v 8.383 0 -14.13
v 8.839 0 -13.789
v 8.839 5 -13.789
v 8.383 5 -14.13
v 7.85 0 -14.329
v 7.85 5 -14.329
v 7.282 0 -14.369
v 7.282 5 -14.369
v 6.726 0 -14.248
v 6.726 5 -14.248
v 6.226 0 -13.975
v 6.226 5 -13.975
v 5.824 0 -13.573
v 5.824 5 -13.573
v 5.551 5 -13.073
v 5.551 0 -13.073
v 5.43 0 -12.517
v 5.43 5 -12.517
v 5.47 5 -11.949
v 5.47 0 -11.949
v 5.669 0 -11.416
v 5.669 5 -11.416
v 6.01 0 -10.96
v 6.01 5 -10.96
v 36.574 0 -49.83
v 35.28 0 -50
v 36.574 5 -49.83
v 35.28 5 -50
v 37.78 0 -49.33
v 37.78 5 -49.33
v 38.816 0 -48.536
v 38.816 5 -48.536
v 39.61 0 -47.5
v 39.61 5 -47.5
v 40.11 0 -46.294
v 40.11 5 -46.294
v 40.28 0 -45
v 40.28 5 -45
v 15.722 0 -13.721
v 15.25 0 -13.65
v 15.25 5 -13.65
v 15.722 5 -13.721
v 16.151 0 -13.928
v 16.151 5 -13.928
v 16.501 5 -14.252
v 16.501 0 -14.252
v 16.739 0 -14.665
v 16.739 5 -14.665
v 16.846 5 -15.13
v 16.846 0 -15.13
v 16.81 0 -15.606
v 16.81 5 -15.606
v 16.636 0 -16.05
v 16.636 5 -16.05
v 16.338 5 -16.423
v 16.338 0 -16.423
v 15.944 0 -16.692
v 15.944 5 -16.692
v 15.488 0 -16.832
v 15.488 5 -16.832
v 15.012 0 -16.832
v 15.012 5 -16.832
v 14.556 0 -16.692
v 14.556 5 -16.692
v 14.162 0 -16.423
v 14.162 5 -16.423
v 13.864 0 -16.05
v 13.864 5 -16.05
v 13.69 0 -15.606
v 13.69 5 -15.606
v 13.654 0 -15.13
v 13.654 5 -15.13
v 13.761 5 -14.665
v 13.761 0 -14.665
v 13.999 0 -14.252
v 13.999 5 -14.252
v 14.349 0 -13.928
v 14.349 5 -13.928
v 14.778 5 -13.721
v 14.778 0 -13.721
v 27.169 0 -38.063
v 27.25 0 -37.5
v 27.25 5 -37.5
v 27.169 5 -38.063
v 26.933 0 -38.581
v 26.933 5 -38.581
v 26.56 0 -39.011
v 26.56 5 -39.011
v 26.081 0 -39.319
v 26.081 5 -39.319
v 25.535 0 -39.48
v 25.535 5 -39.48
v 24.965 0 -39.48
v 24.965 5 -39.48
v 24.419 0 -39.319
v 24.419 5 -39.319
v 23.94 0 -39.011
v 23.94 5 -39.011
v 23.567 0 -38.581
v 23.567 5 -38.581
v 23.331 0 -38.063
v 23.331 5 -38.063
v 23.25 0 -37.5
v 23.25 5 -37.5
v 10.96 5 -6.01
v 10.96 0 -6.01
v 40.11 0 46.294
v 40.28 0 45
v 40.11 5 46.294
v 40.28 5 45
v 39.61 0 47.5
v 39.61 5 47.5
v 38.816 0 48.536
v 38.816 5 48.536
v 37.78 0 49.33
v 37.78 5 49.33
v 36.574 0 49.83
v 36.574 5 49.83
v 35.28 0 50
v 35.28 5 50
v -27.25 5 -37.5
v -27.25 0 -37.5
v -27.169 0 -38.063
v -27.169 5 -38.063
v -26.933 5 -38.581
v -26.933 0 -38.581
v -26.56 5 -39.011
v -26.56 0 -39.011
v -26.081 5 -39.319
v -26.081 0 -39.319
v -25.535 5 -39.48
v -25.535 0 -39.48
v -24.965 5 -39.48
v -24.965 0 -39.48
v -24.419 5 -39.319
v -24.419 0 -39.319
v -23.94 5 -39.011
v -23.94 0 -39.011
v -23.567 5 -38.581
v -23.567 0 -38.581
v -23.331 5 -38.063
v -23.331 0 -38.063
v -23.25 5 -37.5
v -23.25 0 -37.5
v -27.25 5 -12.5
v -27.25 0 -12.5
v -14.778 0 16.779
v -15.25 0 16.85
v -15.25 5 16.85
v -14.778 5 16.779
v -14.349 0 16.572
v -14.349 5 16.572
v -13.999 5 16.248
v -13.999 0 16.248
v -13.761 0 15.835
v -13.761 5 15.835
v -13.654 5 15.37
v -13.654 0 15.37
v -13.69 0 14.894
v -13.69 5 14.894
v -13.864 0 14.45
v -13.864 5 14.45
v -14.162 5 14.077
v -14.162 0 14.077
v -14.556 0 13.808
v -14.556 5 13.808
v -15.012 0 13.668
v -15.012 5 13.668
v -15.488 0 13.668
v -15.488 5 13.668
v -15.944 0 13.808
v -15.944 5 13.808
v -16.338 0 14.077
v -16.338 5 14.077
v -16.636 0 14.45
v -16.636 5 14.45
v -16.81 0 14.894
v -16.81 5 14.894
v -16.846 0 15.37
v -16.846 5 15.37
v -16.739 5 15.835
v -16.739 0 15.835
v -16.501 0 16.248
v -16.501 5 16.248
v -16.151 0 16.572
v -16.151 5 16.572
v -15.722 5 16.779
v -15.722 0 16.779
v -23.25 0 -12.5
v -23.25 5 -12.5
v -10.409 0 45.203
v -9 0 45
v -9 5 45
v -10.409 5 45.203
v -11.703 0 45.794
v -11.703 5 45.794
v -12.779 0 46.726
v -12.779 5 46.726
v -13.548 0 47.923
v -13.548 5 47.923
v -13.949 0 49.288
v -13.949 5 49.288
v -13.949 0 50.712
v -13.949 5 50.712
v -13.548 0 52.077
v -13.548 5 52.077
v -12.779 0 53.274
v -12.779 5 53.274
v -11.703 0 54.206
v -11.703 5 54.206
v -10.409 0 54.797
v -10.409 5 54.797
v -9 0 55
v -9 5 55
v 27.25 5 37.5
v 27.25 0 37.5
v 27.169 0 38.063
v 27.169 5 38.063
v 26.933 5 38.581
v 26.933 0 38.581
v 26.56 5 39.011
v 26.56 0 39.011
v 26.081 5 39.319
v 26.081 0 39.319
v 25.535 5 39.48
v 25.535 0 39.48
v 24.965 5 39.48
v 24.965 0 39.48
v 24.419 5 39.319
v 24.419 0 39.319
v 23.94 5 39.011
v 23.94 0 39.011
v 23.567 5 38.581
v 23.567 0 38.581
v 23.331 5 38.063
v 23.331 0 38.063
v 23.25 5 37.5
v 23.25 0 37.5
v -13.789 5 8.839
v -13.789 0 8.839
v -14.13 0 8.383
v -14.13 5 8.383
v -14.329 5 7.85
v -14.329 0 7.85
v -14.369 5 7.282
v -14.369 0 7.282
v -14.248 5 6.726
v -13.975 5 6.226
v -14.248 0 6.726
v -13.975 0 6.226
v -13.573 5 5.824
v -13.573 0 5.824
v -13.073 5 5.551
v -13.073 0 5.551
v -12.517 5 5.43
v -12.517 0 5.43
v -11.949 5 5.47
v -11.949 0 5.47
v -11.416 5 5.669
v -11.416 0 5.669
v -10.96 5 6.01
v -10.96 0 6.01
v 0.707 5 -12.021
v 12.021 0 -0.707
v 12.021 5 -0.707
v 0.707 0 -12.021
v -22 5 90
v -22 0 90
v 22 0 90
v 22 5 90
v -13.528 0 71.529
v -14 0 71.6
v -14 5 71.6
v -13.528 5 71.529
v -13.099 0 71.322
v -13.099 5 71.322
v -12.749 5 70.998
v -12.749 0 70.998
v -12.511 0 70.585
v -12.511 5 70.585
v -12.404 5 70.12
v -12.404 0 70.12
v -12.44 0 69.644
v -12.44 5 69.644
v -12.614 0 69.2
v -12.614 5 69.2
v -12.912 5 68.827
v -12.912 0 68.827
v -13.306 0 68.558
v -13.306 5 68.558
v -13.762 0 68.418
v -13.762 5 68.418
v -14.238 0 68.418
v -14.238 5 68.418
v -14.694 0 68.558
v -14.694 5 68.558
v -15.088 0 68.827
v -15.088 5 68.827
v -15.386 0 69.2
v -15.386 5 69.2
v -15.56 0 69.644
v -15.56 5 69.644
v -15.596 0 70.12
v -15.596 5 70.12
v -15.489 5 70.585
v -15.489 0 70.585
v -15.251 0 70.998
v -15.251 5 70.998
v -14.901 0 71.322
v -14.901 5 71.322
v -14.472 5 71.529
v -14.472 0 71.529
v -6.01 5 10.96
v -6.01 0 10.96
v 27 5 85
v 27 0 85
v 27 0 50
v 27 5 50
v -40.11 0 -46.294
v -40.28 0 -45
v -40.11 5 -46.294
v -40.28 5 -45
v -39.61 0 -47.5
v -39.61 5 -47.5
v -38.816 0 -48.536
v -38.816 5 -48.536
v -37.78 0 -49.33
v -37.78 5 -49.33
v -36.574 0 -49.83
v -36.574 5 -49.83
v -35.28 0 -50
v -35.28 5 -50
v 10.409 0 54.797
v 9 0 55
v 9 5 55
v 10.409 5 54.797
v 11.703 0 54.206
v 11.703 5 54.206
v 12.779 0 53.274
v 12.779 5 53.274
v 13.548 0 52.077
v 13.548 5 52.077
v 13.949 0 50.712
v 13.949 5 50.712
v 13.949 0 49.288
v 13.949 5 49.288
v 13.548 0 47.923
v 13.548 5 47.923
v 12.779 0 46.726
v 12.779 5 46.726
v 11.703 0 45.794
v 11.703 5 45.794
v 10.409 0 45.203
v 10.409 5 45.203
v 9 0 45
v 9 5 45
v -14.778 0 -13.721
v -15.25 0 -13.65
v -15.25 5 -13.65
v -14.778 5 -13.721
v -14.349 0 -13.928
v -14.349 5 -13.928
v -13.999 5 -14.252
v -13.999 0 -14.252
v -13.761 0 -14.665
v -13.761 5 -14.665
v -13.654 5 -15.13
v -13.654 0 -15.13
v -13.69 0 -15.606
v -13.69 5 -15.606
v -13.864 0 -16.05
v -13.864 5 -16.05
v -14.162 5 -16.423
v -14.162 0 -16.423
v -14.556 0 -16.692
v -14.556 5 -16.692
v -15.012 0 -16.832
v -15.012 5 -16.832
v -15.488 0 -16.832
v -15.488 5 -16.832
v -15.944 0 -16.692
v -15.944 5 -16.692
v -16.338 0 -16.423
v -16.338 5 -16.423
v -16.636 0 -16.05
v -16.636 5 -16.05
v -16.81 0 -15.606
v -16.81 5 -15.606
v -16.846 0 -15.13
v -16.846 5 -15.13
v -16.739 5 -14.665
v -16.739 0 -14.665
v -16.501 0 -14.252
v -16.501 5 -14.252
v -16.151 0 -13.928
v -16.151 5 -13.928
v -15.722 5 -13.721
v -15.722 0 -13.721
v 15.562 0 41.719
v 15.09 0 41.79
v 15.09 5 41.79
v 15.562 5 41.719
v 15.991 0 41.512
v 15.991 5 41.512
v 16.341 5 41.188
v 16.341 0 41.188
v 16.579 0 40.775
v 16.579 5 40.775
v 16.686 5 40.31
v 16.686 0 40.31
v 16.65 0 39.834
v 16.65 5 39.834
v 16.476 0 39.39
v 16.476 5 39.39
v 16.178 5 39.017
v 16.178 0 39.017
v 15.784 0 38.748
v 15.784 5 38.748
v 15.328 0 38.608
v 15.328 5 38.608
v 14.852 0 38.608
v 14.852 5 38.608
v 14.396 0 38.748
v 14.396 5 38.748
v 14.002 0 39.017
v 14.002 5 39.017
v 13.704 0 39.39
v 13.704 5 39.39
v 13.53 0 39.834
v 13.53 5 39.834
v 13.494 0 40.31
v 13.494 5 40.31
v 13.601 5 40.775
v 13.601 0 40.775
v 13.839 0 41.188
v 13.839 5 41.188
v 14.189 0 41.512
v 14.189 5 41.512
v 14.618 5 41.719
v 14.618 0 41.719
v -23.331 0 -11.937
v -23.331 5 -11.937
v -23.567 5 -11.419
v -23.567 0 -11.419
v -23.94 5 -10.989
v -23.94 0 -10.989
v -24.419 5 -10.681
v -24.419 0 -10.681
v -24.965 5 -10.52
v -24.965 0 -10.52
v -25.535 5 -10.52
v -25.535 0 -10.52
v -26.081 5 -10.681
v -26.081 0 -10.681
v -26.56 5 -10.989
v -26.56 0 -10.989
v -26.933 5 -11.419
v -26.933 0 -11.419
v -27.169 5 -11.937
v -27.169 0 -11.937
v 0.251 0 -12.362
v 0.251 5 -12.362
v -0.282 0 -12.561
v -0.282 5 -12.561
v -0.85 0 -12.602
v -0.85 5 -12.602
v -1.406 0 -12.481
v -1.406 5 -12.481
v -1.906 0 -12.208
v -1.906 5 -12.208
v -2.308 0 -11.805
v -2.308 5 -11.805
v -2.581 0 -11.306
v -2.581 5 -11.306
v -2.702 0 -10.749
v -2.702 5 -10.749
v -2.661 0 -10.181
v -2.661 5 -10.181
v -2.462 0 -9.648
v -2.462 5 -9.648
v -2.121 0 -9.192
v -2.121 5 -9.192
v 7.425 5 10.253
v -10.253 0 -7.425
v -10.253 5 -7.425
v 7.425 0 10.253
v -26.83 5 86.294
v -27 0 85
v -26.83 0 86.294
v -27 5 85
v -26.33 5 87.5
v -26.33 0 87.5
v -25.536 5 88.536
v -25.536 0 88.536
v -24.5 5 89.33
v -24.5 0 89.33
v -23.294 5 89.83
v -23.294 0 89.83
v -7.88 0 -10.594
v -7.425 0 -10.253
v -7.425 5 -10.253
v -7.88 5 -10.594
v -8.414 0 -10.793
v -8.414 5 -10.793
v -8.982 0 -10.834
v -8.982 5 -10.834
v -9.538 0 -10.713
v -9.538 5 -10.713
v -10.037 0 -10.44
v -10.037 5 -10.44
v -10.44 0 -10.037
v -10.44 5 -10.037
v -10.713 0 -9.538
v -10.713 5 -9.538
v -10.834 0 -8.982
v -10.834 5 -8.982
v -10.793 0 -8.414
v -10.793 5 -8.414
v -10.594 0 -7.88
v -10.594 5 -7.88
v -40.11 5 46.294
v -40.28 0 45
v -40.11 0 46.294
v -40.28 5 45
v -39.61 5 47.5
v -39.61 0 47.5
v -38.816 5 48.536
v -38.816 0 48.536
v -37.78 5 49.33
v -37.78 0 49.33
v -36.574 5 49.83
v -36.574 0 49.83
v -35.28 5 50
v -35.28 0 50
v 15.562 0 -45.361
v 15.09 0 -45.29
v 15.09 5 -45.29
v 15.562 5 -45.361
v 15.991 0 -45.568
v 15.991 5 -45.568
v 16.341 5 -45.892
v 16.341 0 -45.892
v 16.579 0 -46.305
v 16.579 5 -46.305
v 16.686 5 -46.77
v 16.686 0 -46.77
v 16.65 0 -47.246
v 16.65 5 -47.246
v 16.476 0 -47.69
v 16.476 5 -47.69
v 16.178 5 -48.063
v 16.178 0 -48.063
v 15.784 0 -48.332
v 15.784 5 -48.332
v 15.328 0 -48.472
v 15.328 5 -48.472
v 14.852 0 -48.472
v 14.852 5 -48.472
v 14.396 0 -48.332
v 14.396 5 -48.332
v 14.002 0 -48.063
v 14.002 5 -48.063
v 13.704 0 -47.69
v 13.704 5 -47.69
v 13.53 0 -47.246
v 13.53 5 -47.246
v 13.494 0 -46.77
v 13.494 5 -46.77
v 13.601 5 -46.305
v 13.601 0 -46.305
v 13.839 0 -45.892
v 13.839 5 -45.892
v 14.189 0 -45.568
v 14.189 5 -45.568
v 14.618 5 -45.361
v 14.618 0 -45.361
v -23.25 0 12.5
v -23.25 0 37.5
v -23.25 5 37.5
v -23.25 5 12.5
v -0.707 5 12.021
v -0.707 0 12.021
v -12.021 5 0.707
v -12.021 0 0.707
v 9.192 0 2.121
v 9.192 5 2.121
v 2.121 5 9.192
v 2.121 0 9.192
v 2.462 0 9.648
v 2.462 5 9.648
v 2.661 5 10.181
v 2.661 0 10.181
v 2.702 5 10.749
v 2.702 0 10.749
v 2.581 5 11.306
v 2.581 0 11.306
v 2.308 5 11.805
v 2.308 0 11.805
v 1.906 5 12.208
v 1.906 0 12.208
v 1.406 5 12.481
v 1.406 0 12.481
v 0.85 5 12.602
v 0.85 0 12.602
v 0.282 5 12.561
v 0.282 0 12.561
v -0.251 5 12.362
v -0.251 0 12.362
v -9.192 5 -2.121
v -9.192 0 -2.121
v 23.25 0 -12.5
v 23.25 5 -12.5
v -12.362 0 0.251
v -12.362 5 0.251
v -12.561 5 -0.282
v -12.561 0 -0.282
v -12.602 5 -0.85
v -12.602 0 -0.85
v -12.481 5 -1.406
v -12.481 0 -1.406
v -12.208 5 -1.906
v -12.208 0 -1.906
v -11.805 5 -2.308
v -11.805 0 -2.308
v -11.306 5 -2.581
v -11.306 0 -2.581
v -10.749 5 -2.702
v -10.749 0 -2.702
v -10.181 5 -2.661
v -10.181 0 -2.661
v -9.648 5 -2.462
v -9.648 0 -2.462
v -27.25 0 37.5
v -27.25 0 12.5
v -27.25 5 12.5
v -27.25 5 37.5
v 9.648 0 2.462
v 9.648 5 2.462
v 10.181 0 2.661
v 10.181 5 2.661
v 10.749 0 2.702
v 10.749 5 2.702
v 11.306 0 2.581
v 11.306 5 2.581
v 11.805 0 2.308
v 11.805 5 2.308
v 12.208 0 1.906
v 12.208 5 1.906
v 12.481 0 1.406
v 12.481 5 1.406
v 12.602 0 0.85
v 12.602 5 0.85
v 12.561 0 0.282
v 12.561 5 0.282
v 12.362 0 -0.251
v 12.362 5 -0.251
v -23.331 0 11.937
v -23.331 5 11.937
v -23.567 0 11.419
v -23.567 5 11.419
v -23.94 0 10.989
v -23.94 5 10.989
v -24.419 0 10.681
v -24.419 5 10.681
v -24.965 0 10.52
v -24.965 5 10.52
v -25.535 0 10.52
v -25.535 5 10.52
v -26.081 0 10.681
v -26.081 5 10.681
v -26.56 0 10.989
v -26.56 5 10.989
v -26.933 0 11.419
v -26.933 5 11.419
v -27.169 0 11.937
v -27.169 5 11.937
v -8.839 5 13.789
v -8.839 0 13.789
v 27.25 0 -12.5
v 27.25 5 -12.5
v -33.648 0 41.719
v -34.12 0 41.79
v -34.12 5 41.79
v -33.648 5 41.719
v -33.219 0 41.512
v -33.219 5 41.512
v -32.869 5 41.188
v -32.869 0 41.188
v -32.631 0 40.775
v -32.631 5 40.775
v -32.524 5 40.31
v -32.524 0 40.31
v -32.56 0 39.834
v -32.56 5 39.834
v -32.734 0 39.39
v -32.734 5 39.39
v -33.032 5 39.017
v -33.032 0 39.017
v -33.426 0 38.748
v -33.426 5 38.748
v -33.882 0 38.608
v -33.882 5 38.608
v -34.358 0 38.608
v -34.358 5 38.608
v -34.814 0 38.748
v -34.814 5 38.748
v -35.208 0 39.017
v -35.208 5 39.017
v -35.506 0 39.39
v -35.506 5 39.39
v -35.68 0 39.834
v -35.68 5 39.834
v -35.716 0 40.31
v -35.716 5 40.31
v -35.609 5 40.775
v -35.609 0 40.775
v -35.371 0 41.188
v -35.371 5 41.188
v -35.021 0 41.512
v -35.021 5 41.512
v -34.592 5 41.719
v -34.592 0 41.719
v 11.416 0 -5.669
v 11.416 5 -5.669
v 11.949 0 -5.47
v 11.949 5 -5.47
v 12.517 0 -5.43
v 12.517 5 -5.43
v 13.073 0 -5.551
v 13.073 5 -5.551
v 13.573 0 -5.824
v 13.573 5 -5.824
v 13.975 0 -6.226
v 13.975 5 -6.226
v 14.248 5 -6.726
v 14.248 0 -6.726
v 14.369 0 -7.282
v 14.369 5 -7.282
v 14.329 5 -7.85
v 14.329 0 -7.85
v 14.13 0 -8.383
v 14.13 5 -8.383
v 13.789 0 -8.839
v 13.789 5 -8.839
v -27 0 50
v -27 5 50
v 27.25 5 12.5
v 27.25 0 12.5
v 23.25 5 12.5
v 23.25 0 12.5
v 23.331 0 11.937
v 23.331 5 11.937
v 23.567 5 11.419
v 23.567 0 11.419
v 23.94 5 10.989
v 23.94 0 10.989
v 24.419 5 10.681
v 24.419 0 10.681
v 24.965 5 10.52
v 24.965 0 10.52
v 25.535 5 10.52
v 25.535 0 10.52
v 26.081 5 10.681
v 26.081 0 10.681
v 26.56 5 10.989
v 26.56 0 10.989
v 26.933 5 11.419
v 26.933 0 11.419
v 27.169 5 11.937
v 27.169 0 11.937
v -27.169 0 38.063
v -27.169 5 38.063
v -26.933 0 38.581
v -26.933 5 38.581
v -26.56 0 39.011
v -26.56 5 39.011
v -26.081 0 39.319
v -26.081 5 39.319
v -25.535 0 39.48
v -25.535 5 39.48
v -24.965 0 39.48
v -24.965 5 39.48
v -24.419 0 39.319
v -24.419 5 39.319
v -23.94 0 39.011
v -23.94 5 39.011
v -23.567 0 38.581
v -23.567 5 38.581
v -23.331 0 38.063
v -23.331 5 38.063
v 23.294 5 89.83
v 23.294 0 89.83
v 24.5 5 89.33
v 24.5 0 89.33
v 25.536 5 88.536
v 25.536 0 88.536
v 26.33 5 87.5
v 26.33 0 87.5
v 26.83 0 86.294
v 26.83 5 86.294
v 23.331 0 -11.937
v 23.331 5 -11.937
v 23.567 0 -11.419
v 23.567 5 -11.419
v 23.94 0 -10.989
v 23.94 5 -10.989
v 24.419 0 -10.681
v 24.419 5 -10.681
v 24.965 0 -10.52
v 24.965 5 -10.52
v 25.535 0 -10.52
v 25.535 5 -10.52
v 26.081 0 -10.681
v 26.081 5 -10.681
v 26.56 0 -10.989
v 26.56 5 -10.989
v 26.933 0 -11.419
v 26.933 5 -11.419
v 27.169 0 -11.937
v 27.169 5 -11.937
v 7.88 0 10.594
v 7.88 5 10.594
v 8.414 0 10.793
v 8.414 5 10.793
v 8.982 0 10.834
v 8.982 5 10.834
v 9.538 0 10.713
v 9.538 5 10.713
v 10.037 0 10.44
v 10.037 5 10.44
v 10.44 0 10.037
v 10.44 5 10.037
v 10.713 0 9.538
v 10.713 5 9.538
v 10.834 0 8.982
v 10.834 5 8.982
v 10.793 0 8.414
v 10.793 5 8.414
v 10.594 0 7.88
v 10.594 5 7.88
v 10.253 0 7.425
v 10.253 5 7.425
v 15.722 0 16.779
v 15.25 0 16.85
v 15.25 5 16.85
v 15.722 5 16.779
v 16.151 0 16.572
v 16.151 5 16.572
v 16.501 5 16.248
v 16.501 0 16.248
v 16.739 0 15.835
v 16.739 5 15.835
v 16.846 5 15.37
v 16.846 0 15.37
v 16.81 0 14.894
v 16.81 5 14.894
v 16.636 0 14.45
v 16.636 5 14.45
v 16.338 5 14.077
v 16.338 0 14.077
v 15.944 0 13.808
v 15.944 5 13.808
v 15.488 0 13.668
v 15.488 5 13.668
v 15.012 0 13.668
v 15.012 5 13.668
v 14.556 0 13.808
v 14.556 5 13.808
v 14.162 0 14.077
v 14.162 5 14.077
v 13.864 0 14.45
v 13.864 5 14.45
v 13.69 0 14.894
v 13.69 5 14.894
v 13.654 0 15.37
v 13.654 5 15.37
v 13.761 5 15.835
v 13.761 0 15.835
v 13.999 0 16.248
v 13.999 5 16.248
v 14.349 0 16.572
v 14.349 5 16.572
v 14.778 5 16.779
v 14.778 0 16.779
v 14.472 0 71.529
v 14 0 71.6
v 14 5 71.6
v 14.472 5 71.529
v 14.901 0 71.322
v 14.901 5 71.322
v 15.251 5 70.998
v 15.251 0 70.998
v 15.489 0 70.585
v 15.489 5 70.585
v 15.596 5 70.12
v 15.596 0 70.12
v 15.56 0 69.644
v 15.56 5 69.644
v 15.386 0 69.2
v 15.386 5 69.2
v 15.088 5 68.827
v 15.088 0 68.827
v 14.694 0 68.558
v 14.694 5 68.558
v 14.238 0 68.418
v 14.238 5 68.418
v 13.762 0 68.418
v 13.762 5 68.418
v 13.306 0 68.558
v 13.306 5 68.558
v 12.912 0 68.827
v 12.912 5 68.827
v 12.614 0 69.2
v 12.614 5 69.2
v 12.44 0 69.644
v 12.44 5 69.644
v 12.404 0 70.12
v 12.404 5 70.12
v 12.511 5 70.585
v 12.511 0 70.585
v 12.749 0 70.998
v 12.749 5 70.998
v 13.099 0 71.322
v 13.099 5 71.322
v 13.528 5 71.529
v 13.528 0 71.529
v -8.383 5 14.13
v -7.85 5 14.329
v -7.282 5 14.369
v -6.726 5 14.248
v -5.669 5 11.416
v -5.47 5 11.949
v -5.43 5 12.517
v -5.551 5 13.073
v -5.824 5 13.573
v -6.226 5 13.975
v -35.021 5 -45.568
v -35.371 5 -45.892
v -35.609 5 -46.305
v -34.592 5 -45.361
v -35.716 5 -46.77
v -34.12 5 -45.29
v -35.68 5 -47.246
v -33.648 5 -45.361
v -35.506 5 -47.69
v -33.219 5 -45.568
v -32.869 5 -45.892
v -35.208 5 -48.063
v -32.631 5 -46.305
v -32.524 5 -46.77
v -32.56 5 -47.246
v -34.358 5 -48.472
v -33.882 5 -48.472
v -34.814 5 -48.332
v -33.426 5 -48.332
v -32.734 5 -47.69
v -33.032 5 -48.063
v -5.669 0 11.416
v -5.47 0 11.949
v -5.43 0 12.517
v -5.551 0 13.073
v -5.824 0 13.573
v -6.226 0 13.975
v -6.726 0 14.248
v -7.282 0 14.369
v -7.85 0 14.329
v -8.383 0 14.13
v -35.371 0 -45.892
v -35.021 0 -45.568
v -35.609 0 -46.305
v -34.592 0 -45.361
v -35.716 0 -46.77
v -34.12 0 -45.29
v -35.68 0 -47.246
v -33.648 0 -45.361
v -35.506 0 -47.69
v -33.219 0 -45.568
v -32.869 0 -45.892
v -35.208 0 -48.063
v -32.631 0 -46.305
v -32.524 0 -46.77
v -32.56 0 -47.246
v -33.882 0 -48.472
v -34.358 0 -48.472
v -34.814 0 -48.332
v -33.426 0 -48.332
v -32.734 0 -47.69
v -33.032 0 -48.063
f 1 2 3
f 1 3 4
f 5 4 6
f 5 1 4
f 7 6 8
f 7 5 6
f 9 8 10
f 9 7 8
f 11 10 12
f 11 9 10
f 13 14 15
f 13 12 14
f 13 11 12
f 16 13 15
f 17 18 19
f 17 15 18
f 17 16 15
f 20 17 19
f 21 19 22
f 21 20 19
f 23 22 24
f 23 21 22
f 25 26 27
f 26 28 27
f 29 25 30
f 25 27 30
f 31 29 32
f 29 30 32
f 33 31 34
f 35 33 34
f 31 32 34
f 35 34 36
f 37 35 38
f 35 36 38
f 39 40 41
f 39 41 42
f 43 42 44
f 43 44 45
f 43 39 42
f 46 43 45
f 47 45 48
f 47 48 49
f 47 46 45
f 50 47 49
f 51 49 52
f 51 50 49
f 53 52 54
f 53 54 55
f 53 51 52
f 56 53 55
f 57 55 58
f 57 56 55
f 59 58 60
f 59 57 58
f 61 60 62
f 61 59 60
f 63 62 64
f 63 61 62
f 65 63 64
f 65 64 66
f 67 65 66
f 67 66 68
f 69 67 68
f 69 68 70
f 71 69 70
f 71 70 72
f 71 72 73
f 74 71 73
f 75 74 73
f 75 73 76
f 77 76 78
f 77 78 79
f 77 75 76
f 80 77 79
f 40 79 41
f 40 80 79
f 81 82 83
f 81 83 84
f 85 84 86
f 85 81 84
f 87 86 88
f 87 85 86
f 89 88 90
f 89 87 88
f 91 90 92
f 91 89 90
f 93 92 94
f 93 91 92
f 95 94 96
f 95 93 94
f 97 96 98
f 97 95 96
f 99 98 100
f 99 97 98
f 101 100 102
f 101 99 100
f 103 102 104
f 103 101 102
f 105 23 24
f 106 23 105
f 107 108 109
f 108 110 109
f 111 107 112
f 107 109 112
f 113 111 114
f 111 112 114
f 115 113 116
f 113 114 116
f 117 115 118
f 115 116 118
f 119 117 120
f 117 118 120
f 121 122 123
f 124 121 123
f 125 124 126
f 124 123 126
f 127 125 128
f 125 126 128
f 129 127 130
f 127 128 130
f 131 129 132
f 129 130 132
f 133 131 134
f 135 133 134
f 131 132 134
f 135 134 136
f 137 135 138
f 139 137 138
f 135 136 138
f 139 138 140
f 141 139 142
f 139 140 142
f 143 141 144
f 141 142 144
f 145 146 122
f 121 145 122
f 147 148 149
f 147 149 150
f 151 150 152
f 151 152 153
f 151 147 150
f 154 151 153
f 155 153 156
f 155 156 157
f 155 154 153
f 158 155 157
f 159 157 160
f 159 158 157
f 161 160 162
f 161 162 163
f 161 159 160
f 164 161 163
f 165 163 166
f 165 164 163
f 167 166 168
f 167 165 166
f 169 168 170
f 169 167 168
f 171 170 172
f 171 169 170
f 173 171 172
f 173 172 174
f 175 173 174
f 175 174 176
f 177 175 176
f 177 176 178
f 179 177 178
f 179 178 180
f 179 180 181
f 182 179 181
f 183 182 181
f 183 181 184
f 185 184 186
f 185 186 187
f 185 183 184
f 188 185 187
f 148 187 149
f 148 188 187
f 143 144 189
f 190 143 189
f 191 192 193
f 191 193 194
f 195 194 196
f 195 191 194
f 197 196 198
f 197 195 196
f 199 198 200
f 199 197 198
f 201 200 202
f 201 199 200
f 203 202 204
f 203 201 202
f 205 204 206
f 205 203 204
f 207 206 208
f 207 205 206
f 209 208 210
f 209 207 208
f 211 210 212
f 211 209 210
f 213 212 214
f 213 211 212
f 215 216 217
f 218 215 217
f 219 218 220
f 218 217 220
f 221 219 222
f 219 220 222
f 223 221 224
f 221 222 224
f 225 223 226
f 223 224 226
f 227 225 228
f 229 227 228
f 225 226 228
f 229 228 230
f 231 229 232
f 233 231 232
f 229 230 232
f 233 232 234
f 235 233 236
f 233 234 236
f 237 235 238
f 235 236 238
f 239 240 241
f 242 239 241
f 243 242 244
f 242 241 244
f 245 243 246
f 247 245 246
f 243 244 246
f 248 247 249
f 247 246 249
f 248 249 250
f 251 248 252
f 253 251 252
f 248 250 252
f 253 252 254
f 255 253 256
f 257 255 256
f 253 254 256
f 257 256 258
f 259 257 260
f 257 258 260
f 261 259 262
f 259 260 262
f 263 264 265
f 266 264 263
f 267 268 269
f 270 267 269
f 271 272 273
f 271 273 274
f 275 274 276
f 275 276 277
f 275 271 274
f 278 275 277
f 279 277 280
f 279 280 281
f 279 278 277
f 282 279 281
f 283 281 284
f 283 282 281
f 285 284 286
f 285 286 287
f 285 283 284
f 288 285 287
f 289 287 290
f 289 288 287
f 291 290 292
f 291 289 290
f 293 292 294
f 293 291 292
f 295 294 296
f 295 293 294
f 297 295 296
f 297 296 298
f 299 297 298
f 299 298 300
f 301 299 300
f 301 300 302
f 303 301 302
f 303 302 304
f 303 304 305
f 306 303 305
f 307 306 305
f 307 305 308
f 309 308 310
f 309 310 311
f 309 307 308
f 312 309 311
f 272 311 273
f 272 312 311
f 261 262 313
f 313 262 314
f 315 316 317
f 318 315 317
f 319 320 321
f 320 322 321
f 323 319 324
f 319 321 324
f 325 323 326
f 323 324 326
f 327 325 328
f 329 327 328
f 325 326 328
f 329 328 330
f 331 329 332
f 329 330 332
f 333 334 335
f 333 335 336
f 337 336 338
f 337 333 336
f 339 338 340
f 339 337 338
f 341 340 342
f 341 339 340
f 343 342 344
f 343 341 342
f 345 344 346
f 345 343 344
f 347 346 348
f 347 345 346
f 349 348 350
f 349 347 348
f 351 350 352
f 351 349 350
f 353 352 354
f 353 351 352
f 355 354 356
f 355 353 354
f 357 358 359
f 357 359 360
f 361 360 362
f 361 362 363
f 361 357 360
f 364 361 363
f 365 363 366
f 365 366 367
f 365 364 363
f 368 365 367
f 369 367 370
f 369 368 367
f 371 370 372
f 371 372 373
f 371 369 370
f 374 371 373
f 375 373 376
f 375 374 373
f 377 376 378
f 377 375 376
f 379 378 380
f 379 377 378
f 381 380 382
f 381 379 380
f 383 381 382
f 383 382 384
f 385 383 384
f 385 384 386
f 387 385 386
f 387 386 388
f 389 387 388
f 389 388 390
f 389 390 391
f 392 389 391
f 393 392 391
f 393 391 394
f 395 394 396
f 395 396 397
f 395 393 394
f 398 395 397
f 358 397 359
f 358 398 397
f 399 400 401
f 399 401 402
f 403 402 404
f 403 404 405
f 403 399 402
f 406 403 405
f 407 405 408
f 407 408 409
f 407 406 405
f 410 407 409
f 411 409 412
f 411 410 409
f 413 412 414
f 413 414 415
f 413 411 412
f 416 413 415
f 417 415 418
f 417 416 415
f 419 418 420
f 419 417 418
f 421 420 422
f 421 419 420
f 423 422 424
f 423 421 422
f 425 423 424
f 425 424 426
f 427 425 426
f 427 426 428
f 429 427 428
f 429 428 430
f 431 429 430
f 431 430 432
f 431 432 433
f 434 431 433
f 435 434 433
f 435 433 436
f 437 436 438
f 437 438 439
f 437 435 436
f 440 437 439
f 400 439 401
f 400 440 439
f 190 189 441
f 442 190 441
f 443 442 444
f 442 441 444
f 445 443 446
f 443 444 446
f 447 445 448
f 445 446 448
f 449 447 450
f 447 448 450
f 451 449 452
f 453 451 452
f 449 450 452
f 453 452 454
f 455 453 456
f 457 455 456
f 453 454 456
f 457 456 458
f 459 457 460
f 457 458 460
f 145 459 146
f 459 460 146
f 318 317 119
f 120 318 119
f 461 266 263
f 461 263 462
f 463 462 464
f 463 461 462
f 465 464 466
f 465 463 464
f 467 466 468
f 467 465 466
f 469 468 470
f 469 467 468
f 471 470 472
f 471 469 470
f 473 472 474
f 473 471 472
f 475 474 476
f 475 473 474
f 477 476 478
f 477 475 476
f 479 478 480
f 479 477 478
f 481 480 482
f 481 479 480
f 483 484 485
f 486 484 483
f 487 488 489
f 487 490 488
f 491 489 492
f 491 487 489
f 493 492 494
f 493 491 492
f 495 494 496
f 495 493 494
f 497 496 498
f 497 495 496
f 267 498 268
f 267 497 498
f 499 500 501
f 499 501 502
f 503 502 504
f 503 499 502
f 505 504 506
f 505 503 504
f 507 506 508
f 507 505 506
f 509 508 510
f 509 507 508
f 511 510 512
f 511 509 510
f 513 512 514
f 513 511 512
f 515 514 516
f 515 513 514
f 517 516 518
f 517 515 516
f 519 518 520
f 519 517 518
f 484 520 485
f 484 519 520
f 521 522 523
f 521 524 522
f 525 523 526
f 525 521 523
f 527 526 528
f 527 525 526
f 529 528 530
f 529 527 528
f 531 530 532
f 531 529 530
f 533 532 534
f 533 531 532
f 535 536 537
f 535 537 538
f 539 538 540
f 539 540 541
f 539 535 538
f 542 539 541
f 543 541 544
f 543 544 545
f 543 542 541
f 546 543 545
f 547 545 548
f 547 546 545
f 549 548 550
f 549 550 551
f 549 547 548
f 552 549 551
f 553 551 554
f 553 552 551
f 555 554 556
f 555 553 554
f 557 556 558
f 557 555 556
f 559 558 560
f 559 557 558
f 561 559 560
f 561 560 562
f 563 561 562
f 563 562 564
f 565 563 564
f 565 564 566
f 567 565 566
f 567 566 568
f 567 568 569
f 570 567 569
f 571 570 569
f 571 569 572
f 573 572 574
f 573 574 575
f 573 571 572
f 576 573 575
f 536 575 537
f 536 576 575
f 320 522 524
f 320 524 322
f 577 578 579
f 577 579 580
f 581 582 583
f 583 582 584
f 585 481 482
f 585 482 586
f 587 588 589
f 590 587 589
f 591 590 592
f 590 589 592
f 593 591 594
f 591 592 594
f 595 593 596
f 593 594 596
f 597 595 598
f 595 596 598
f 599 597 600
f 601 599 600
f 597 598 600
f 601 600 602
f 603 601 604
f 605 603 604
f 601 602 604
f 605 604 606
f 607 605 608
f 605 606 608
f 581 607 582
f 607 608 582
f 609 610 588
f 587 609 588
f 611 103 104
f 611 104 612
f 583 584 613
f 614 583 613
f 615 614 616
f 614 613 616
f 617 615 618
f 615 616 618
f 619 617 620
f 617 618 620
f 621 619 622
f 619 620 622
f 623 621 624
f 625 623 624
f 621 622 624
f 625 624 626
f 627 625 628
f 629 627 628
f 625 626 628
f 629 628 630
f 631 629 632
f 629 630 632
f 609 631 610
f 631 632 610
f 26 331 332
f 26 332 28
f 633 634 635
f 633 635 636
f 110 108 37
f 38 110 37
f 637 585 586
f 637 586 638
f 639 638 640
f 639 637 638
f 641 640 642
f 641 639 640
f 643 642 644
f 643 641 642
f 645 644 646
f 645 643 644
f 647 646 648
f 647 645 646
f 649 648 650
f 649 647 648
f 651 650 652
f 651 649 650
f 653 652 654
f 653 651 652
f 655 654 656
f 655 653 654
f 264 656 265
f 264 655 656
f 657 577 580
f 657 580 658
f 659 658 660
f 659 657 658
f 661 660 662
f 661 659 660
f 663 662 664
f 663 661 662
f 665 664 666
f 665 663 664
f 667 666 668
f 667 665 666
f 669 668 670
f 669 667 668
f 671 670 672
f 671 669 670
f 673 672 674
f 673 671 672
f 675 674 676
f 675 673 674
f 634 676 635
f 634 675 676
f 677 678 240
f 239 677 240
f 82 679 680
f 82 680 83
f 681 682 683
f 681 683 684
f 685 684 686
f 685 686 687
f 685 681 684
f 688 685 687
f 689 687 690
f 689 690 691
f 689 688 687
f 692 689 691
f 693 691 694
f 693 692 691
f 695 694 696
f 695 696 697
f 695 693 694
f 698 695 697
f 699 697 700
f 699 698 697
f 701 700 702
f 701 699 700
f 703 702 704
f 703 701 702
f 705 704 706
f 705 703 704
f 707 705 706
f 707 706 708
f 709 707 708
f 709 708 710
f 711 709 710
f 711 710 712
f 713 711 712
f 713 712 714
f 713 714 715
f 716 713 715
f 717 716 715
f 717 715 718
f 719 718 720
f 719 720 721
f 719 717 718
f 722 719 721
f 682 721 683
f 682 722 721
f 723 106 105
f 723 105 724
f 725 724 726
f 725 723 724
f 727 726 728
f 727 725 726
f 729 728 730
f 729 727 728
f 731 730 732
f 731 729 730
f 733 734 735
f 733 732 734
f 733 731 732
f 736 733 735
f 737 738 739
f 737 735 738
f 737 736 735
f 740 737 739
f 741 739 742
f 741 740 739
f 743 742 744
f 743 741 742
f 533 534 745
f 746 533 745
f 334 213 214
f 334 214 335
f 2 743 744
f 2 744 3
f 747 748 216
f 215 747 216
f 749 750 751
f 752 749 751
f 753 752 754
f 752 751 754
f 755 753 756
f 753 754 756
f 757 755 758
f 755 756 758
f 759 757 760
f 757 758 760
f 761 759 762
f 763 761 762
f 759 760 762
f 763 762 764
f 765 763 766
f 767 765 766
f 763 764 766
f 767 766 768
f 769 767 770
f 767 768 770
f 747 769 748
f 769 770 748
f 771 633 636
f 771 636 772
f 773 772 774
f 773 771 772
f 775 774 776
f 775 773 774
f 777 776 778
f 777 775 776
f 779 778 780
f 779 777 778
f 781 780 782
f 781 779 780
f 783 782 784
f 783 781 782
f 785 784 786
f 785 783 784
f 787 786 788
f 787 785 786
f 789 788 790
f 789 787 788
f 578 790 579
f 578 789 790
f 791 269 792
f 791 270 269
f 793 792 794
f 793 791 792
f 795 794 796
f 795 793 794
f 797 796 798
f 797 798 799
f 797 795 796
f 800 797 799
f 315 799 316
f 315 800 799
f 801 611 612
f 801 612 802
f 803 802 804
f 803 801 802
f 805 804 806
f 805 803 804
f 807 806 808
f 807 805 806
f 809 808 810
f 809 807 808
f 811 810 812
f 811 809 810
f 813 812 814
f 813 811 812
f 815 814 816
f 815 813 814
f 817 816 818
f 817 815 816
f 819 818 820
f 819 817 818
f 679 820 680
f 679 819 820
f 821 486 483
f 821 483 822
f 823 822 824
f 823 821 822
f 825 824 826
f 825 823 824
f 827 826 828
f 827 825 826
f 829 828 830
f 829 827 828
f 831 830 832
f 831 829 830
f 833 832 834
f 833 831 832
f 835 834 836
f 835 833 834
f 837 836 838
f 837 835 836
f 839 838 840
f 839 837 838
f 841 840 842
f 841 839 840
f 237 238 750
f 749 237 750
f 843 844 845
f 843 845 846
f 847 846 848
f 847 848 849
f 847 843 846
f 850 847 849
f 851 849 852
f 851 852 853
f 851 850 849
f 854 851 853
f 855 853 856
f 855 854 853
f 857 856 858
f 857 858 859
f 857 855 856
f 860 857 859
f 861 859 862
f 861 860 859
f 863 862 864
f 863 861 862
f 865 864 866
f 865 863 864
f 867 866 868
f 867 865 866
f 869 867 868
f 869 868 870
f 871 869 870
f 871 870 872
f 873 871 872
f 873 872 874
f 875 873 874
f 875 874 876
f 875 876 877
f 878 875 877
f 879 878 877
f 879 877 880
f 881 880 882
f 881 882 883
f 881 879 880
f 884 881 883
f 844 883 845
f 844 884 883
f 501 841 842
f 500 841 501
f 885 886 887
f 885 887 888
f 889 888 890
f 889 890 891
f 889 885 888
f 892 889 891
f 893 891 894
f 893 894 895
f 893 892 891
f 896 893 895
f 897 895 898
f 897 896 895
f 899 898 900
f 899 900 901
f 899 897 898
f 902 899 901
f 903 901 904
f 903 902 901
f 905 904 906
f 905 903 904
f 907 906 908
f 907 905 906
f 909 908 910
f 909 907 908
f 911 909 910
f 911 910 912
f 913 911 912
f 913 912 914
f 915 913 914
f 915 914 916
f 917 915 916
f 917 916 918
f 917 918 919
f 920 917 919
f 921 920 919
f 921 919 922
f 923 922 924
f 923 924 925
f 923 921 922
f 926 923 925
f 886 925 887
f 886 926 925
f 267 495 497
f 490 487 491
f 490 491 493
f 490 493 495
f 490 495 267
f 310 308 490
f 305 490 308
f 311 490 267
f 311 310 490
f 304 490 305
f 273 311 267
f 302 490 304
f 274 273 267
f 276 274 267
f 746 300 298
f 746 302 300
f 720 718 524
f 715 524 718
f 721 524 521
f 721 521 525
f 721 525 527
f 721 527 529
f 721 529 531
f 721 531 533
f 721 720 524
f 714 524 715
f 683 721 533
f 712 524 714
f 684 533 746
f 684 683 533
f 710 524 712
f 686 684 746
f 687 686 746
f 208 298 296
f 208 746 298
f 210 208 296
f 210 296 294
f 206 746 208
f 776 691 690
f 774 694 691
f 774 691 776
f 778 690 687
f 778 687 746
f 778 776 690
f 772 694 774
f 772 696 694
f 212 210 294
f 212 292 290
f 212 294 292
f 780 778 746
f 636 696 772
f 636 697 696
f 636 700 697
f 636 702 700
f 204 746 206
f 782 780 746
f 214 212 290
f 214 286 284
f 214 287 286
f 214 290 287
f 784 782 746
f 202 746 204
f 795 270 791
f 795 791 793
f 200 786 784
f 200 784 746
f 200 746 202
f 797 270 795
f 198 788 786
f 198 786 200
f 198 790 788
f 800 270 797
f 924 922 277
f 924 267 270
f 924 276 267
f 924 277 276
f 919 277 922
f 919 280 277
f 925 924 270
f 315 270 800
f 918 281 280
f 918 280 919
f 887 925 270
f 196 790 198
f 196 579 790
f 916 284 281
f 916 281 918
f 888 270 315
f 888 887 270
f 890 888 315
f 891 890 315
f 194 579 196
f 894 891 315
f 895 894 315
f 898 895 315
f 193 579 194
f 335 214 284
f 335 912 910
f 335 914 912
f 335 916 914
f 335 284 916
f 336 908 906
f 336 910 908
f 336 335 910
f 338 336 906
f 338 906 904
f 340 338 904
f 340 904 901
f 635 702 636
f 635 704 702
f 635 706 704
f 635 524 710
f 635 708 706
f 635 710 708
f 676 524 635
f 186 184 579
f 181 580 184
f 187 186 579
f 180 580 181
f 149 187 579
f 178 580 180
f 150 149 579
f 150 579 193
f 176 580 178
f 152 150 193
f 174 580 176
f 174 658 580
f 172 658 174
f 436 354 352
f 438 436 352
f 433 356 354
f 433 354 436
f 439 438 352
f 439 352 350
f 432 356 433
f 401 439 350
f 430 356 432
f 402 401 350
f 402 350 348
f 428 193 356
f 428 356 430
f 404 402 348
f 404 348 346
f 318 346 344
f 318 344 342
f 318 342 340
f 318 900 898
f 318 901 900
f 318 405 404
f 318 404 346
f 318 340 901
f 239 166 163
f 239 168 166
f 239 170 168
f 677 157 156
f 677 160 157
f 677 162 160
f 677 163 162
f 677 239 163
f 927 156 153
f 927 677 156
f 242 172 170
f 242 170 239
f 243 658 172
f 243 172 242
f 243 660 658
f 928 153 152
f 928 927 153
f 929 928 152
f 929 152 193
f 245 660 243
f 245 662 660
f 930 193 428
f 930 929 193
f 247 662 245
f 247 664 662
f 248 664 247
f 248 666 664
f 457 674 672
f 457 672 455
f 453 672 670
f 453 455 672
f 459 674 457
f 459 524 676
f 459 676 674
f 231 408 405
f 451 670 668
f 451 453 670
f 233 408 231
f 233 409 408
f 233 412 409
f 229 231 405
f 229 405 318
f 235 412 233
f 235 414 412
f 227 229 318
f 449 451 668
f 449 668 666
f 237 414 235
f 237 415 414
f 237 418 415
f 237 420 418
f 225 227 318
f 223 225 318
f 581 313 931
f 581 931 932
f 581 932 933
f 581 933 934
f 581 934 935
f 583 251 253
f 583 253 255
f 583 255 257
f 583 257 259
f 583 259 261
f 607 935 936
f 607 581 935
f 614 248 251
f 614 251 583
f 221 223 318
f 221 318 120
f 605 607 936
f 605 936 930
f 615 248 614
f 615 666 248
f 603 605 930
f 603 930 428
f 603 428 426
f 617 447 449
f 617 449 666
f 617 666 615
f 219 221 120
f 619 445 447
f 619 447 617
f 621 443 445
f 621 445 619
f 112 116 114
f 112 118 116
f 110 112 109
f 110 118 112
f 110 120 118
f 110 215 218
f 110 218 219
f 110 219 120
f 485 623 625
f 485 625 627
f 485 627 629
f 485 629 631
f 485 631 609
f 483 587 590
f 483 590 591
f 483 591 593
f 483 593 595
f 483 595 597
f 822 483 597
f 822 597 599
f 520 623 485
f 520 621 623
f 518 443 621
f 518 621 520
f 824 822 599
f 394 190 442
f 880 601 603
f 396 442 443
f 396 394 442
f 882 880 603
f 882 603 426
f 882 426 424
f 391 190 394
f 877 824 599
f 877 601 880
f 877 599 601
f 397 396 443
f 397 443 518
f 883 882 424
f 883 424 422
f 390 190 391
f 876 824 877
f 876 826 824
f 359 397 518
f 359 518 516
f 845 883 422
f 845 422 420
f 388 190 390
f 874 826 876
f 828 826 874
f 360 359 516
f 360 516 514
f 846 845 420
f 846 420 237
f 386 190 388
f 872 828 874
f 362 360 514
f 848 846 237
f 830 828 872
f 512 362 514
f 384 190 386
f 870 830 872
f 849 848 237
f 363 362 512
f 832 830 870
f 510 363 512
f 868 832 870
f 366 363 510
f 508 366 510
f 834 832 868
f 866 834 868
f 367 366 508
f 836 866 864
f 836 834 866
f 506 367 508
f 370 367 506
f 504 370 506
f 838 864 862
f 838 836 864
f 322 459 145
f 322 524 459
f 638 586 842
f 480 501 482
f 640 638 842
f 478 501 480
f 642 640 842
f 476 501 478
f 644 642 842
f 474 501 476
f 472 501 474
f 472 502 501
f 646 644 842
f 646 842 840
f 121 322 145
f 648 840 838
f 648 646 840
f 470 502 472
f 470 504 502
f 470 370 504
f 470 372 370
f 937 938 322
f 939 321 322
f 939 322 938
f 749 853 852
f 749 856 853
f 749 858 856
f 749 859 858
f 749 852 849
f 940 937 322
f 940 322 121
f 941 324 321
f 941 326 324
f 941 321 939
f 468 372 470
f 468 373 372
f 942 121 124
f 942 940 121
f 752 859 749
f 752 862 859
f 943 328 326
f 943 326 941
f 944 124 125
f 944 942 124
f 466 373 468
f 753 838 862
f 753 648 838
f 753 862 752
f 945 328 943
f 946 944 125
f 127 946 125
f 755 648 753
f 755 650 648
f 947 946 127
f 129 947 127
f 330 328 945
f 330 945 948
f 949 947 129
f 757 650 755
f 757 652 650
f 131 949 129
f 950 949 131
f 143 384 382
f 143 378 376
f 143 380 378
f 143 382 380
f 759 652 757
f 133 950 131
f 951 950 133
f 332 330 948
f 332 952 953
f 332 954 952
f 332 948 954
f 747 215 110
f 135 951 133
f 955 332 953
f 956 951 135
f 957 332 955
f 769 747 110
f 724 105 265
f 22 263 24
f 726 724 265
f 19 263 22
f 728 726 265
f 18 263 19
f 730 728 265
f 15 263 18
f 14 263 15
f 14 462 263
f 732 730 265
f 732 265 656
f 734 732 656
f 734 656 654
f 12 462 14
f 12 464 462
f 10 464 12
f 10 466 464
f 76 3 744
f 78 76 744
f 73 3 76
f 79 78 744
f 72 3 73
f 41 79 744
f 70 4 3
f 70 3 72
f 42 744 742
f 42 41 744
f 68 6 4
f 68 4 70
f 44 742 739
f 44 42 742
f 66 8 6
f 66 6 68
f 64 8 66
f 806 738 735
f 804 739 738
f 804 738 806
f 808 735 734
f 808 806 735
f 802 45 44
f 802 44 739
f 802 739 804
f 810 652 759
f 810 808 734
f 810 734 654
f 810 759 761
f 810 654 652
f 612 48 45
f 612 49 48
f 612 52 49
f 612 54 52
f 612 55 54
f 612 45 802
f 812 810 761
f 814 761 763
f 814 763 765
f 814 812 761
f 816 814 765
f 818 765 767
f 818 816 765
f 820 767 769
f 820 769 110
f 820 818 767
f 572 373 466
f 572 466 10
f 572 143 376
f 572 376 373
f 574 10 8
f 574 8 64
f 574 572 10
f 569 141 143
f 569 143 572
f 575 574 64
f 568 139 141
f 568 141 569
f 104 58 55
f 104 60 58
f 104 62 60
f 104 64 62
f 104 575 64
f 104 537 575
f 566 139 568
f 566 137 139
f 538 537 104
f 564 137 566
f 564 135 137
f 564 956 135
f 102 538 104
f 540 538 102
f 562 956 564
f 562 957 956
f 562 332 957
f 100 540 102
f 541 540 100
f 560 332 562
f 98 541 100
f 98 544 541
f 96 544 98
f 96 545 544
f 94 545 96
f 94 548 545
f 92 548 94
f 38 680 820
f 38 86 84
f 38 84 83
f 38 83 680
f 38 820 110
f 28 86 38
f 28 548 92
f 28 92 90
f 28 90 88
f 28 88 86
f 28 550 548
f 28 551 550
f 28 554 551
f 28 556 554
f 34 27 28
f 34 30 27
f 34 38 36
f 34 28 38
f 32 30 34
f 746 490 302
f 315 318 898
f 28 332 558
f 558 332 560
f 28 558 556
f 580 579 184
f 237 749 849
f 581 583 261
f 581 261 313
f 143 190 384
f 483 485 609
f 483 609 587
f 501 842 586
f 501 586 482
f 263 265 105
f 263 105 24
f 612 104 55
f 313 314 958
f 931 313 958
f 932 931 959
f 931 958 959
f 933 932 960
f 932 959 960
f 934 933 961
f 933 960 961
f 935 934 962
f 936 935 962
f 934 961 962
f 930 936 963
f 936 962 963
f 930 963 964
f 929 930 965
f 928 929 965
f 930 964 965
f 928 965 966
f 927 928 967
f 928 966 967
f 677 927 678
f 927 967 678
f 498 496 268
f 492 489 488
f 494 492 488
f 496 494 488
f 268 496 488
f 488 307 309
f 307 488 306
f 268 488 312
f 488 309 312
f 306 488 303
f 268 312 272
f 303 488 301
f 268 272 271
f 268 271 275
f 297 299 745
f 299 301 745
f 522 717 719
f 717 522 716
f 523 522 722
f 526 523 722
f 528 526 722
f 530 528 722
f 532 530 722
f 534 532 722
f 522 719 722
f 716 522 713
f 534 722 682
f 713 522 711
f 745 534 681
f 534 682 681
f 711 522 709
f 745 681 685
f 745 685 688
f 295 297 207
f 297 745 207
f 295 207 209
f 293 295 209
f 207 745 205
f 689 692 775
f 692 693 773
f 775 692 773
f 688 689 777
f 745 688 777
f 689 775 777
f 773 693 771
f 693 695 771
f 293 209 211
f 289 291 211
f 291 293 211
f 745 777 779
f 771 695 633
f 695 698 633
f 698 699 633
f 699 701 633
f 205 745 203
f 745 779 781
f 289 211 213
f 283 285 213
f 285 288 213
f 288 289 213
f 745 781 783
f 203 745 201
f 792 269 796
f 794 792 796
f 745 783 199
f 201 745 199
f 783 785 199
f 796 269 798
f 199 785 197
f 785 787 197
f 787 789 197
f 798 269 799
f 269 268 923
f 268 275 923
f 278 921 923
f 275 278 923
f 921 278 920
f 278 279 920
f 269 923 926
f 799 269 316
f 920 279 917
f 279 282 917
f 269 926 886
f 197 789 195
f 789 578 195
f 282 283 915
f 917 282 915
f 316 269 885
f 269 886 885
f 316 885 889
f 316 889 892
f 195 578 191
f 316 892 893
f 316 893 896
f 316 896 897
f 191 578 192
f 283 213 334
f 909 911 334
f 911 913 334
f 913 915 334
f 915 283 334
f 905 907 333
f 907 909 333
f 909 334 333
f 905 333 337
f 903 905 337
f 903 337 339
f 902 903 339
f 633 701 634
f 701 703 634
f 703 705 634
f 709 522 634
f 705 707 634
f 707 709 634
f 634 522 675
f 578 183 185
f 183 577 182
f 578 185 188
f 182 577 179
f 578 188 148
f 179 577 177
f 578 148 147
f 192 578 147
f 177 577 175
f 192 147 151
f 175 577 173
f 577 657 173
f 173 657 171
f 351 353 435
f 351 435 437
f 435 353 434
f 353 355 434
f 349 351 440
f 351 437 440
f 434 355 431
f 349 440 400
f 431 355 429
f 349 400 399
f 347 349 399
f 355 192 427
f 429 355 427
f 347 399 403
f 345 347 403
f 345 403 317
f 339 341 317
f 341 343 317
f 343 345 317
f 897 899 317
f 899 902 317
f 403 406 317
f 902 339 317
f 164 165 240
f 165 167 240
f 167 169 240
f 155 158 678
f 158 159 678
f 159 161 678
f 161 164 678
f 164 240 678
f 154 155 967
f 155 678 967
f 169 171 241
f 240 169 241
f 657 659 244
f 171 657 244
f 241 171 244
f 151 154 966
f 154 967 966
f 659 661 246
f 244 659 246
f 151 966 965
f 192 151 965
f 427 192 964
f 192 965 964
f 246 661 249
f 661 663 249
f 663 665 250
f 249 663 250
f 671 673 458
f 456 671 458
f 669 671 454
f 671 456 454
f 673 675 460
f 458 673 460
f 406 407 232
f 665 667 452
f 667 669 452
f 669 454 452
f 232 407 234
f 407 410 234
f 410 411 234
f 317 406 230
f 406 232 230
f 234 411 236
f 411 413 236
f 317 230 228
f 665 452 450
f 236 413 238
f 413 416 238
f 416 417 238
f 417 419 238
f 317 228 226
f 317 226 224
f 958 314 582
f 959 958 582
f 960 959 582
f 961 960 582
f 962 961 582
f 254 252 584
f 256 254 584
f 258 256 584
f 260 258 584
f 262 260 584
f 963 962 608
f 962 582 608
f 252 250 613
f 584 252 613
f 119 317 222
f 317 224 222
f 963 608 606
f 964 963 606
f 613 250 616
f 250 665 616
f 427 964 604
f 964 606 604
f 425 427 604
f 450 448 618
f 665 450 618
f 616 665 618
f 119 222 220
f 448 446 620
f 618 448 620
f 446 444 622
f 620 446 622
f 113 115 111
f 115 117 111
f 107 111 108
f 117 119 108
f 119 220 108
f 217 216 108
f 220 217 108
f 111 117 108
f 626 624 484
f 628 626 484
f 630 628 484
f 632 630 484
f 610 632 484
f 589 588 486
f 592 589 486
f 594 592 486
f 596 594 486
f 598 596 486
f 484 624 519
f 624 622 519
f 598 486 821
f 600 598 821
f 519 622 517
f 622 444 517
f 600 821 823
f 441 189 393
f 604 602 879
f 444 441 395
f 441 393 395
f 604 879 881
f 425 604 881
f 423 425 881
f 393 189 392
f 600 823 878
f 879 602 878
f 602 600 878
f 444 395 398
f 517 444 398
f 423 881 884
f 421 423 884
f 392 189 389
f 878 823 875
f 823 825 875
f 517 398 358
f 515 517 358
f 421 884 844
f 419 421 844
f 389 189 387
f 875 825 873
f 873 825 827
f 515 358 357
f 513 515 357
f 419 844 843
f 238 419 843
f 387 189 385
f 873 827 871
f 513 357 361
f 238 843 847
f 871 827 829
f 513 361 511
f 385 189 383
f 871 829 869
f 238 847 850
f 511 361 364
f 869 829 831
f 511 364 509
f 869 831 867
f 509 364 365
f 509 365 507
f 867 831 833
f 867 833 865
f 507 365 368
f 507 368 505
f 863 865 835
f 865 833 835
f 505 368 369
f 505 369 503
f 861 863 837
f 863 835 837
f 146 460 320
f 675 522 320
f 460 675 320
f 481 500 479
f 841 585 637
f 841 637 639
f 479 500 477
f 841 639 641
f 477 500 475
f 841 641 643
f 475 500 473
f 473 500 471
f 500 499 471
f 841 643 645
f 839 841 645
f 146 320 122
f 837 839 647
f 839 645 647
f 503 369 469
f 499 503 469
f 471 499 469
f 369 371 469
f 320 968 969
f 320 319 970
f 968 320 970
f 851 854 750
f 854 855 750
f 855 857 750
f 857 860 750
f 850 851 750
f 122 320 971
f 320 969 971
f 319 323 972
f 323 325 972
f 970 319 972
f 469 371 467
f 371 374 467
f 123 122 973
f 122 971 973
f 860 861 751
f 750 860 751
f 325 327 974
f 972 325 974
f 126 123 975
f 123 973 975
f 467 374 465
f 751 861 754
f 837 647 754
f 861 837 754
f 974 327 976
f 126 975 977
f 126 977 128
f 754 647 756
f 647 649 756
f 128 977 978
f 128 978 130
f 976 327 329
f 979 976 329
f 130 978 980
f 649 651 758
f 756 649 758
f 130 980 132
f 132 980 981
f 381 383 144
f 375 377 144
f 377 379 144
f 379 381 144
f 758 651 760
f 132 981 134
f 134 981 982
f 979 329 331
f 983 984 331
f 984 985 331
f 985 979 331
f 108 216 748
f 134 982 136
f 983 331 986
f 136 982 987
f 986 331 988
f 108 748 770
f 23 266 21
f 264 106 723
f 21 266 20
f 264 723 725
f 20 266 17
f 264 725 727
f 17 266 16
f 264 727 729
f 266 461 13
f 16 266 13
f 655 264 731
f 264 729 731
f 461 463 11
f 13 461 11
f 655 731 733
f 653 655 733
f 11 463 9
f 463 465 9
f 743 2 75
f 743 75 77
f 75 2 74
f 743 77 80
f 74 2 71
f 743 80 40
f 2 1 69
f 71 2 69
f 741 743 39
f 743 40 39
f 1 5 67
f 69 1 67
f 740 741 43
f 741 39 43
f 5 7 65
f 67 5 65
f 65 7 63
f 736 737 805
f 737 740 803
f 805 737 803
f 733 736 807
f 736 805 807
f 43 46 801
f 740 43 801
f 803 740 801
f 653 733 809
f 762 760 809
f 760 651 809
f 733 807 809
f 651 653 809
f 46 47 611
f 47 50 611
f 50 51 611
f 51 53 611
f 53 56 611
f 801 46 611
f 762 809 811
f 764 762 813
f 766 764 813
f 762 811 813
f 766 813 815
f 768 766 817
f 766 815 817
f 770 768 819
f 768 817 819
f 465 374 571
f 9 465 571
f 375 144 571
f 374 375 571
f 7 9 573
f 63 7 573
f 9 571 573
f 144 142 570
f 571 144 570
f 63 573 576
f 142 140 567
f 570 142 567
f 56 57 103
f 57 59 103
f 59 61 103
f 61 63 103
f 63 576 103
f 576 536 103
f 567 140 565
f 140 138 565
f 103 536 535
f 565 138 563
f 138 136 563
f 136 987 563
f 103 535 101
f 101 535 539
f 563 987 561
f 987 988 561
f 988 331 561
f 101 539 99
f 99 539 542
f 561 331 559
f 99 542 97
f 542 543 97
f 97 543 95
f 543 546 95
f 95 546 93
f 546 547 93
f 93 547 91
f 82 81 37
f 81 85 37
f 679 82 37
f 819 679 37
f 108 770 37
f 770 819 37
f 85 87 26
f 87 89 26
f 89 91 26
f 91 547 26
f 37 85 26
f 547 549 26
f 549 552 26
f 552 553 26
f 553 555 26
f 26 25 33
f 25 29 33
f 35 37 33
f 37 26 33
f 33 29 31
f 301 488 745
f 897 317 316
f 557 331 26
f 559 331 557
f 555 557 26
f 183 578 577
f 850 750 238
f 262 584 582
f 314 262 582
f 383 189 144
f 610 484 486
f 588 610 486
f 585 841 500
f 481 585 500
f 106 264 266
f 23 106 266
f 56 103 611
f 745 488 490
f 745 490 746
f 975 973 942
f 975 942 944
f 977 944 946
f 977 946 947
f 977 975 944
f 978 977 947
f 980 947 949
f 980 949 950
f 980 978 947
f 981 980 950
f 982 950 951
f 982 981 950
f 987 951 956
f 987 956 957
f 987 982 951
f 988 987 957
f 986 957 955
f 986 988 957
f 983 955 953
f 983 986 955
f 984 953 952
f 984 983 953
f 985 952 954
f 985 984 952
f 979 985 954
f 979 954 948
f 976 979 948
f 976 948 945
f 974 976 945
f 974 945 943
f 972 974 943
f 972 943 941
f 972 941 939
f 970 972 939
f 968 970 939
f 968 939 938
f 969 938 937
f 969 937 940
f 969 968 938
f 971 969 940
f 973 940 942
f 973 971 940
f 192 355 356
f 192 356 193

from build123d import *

# Parameters (mm, degrees)
SKETCH_1_W          = 54
SKETCH_1_H          = 40
SKETCH_1_R          = 1.6
SKETCH_1_W_2        = 80.56
SKETCH_1_H_2        = 100
EXTRUDE_1_DEPTH     = 5
CUT_EXTRUDE_5_DEPTH = 99.729318847
FILLET_1_R          = 5


with BuildPart() as part:
    # 草图1 → 凸台-拉伸1 (new body)
    # profile 1 of 2: a face of its own
    with BuildSketch(Plane(origin=(0, 0, 0), x_dir=(1, 0, 0), z_dir=(0, 1, 0))):
        with Locations((0, -70)):
            Rectangle(SKETCH_1_W, SKETCH_1_H)
        with Locations(Location((-14, -70, 0), (0, 0, 270))):
            Circle(SKETCH_1_R, mode=Mode.SUBTRACT)
        with Locations(Location((14, -70, 0), (0, 0, 270))):
            Circle(SKETCH_1_R, mode=Mode.SUBTRACT)
    # profile 2 of 2: a face of its own
    with BuildSketch(Plane(origin=(0, 0, 0), x_dir=(1, 0, 0), z_dir=(0, 1, 0))):
        Rectangle(SKETCH_1_W_2, SKETCH_1_H_2)
        with Locations(Location((15.25, 15.25, 0), (0, 0, 270))):
            Circle(SKETCH_1_R, mode=Mode.SUBTRACT)
        with Locations(Location((-15.25, 15.25, 0), (0, 0, 270))):
            Circle(SKETCH_1_R, mode=Mode.SUBTRACT)
        with Locations(Location((-34.12, -40.19, 0), (0, 0, 270))):
            Circle(SKETCH_1_R, mode=Mode.SUBTRACT)
        with Locations(Location((15.09, -40.19, 0), (0, 0, 270))):
            Circle(SKETCH_1_R, mode=Mode.SUBTRACT)
        with Locations(Location((15.09, 46.89, 0), (0, 0, 270))):
            Circle(SKETCH_1_R, mode=Mode.SUBTRACT)
        with Locations(Location((-34.12, 46.89, 0), (0, 0, 270))):
            Circle(SKETCH_1_R, mode=Mode.SUBTRACT)
        with Locations(Location((15.25, -15.25, 0), (0, 0, 270))):
            Circle(SKETCH_1_R, mode=Mode.SUBTRACT)
        with Locations(Location((-15.25, -15.25, 0), (0, 0, 270))):
            Circle(SKETCH_1_R, mode=Mode.SUBTRACT)
    extrude(amount=EXTRUDE_1_DEPTH)

    # 草图7 → 切除-拉伸5 (cut, through all)
    with BuildSketch(Plane(origin=(0, 0, 0), x_dir=(1, 0, 0), z_dir=(0, 1, 0))):
        with BuildLine():
            ThreePointArc((-6.01040764, -10.960155108), (-6.01040764, -13.788582233), (-8.838834765, -13.788582233))
            Line((-8.838834765, -13.788582233), (-13.788582233, -8.838834765))
            ThreePointArc((-13.788582233, -8.838834765), (-13.788582233, -6.01040764), (-10.960155108, -6.01040764))
            Line((-10.960155108, -6.01040764), (-6.01040764, -10.960155108))
        make_face()
        with BuildLine():
            ThreePointArc((2.121320344, -9.192388155), (2.121320344, -12.02081528), (-0.707106781, -12.02081528))
            Line((-0.707106781, -12.02081528), (-12.02081528, -0.707106781))
            ThreePointArc((-12.02081528, -0.707106781), (-12.02081528, 2.121320344), (-9.192388155, 2.121320344))
            Line((-9.192388155, 2.121320344), (2.121320344, -9.192388155))
        make_face()
        with BuildLine():
            Line((-10.253048327, 7.424621202), (7.424621202, -10.253048327))
            ThreePointArc((7.424621202, -10.253048327), (10.253048327, -10.253048327), (10.253048327, -7.424621202))
            Line((10.253048327, -7.424621202), (-7.424621202, 10.253048327))
            ThreePointArc((-7.424621202, 10.253048327), (-10.253048327, 10.253048327), (-10.253048327, 7.424621202))
        make_face()
        with BuildLine():
            Line((-2.121320344, 9.192388155), (9.192388155, -2.121320344))
            ThreePointArc((9.192388155, -2.121320344), (12.02081528, -2.121320344), (12.02081528, 0.707106781))
            Line((12.02081528, 0.707106781), (0.707106781, 12.02081528))
            ThreePointArc((0.707106781, 12.02081528), (-2.121320344, 12.02081528), (-2.121320344, 9.192388155))
        make_face()
        with BuildLine():
            Line((6.01040764, 10.960155108), (10.960155108, 6.01040764))
            ThreePointArc((10.960155108, 6.01040764), (13.788582233, 6.01040764), (13.788582233, 8.838834765))
            Line((13.788582233, 8.838834765), (8.838834765, 13.788582233))
            ThreePointArc((8.838834765, 13.788582233), (6.01040764, 13.788582233), (6.01040764, 10.960155108))
        make_face()
        with BuildLine():
            ThreePointArc((-23.25, 12.5), (-25.25, 10.5), (-27.25, 12.5))
            Line((-27.25, 12.5), (-27.25, 37.5))
            ThreePointArc((-27.25, 37.5), (-25.25, 39.5), (-23.25, 37.5))
            Line((-23.25, 37.5), (-23.25, 12.5))
        make_face()
        with BuildLine():
            Line((23.25, 37.5), (23.25, 12.5))
            ThreePointArc((23.25, 12.5), (25.25, 10.5), (27.25, 12.5))
            Line((27.25, 12.5), (27.25, 37.5))
            ThreePointArc((27.25, 37.5), (25.25, 39.5), (23.25, 37.5))
        make_face()
        with BuildLine():
            Line((-23.25, -37.5), (-23.25, -12.5))
            ThreePointArc((-23.25, -12.5), (-25.25, -10.5), (-27.25, -12.5))
            Line((-27.25, -12.5), (-27.25, -37.5))
            ThreePointArc((-27.25, -37.5), (-25.25, -39.5), (-23.25, -37.5))
        make_face()
        with BuildLine():
            ThreePointArc((23.25, -12.5), (25.25, -10.5), (27.25, -12.5))
            Line((27.25, -12.5), (27.25, -37.5))
            ThreePointArc((27.25, -37.5), (25.25, -39.5), (23.25, -37.5))
            Line((23.25, -37.5), (23.25, -12.5))
        make_face()
        with BuildLine():
            Line((-9, -55), (9, -55))
            ThreePointArc((9, -55), (14, -50), (9, -45))
            Line((9, -45), (-9, -45))
            ThreePointArc((-9, -45), (-14, -50), (-9, -55))
        make_face()
    extrude(amount=CUT_EXTRUDE_5_DEPTH, mode=Mode.SUBTRACT)

    # 圆角1
    fillet_1_edges = [part.edges().sort_by_distance(p)[0] for p in [
        (-40.28, 2.5, 50),
        (-40.28, 2.5, -50),
        (40.28, 2.5, -50),
        (40.28, 2.5, 50),
        (27, 2.5, 90),
        (-27, 2.5, 90),
    ]]
    fillet(fillet_1_edges, radius=FILLET_1_R)


solid = part.part
